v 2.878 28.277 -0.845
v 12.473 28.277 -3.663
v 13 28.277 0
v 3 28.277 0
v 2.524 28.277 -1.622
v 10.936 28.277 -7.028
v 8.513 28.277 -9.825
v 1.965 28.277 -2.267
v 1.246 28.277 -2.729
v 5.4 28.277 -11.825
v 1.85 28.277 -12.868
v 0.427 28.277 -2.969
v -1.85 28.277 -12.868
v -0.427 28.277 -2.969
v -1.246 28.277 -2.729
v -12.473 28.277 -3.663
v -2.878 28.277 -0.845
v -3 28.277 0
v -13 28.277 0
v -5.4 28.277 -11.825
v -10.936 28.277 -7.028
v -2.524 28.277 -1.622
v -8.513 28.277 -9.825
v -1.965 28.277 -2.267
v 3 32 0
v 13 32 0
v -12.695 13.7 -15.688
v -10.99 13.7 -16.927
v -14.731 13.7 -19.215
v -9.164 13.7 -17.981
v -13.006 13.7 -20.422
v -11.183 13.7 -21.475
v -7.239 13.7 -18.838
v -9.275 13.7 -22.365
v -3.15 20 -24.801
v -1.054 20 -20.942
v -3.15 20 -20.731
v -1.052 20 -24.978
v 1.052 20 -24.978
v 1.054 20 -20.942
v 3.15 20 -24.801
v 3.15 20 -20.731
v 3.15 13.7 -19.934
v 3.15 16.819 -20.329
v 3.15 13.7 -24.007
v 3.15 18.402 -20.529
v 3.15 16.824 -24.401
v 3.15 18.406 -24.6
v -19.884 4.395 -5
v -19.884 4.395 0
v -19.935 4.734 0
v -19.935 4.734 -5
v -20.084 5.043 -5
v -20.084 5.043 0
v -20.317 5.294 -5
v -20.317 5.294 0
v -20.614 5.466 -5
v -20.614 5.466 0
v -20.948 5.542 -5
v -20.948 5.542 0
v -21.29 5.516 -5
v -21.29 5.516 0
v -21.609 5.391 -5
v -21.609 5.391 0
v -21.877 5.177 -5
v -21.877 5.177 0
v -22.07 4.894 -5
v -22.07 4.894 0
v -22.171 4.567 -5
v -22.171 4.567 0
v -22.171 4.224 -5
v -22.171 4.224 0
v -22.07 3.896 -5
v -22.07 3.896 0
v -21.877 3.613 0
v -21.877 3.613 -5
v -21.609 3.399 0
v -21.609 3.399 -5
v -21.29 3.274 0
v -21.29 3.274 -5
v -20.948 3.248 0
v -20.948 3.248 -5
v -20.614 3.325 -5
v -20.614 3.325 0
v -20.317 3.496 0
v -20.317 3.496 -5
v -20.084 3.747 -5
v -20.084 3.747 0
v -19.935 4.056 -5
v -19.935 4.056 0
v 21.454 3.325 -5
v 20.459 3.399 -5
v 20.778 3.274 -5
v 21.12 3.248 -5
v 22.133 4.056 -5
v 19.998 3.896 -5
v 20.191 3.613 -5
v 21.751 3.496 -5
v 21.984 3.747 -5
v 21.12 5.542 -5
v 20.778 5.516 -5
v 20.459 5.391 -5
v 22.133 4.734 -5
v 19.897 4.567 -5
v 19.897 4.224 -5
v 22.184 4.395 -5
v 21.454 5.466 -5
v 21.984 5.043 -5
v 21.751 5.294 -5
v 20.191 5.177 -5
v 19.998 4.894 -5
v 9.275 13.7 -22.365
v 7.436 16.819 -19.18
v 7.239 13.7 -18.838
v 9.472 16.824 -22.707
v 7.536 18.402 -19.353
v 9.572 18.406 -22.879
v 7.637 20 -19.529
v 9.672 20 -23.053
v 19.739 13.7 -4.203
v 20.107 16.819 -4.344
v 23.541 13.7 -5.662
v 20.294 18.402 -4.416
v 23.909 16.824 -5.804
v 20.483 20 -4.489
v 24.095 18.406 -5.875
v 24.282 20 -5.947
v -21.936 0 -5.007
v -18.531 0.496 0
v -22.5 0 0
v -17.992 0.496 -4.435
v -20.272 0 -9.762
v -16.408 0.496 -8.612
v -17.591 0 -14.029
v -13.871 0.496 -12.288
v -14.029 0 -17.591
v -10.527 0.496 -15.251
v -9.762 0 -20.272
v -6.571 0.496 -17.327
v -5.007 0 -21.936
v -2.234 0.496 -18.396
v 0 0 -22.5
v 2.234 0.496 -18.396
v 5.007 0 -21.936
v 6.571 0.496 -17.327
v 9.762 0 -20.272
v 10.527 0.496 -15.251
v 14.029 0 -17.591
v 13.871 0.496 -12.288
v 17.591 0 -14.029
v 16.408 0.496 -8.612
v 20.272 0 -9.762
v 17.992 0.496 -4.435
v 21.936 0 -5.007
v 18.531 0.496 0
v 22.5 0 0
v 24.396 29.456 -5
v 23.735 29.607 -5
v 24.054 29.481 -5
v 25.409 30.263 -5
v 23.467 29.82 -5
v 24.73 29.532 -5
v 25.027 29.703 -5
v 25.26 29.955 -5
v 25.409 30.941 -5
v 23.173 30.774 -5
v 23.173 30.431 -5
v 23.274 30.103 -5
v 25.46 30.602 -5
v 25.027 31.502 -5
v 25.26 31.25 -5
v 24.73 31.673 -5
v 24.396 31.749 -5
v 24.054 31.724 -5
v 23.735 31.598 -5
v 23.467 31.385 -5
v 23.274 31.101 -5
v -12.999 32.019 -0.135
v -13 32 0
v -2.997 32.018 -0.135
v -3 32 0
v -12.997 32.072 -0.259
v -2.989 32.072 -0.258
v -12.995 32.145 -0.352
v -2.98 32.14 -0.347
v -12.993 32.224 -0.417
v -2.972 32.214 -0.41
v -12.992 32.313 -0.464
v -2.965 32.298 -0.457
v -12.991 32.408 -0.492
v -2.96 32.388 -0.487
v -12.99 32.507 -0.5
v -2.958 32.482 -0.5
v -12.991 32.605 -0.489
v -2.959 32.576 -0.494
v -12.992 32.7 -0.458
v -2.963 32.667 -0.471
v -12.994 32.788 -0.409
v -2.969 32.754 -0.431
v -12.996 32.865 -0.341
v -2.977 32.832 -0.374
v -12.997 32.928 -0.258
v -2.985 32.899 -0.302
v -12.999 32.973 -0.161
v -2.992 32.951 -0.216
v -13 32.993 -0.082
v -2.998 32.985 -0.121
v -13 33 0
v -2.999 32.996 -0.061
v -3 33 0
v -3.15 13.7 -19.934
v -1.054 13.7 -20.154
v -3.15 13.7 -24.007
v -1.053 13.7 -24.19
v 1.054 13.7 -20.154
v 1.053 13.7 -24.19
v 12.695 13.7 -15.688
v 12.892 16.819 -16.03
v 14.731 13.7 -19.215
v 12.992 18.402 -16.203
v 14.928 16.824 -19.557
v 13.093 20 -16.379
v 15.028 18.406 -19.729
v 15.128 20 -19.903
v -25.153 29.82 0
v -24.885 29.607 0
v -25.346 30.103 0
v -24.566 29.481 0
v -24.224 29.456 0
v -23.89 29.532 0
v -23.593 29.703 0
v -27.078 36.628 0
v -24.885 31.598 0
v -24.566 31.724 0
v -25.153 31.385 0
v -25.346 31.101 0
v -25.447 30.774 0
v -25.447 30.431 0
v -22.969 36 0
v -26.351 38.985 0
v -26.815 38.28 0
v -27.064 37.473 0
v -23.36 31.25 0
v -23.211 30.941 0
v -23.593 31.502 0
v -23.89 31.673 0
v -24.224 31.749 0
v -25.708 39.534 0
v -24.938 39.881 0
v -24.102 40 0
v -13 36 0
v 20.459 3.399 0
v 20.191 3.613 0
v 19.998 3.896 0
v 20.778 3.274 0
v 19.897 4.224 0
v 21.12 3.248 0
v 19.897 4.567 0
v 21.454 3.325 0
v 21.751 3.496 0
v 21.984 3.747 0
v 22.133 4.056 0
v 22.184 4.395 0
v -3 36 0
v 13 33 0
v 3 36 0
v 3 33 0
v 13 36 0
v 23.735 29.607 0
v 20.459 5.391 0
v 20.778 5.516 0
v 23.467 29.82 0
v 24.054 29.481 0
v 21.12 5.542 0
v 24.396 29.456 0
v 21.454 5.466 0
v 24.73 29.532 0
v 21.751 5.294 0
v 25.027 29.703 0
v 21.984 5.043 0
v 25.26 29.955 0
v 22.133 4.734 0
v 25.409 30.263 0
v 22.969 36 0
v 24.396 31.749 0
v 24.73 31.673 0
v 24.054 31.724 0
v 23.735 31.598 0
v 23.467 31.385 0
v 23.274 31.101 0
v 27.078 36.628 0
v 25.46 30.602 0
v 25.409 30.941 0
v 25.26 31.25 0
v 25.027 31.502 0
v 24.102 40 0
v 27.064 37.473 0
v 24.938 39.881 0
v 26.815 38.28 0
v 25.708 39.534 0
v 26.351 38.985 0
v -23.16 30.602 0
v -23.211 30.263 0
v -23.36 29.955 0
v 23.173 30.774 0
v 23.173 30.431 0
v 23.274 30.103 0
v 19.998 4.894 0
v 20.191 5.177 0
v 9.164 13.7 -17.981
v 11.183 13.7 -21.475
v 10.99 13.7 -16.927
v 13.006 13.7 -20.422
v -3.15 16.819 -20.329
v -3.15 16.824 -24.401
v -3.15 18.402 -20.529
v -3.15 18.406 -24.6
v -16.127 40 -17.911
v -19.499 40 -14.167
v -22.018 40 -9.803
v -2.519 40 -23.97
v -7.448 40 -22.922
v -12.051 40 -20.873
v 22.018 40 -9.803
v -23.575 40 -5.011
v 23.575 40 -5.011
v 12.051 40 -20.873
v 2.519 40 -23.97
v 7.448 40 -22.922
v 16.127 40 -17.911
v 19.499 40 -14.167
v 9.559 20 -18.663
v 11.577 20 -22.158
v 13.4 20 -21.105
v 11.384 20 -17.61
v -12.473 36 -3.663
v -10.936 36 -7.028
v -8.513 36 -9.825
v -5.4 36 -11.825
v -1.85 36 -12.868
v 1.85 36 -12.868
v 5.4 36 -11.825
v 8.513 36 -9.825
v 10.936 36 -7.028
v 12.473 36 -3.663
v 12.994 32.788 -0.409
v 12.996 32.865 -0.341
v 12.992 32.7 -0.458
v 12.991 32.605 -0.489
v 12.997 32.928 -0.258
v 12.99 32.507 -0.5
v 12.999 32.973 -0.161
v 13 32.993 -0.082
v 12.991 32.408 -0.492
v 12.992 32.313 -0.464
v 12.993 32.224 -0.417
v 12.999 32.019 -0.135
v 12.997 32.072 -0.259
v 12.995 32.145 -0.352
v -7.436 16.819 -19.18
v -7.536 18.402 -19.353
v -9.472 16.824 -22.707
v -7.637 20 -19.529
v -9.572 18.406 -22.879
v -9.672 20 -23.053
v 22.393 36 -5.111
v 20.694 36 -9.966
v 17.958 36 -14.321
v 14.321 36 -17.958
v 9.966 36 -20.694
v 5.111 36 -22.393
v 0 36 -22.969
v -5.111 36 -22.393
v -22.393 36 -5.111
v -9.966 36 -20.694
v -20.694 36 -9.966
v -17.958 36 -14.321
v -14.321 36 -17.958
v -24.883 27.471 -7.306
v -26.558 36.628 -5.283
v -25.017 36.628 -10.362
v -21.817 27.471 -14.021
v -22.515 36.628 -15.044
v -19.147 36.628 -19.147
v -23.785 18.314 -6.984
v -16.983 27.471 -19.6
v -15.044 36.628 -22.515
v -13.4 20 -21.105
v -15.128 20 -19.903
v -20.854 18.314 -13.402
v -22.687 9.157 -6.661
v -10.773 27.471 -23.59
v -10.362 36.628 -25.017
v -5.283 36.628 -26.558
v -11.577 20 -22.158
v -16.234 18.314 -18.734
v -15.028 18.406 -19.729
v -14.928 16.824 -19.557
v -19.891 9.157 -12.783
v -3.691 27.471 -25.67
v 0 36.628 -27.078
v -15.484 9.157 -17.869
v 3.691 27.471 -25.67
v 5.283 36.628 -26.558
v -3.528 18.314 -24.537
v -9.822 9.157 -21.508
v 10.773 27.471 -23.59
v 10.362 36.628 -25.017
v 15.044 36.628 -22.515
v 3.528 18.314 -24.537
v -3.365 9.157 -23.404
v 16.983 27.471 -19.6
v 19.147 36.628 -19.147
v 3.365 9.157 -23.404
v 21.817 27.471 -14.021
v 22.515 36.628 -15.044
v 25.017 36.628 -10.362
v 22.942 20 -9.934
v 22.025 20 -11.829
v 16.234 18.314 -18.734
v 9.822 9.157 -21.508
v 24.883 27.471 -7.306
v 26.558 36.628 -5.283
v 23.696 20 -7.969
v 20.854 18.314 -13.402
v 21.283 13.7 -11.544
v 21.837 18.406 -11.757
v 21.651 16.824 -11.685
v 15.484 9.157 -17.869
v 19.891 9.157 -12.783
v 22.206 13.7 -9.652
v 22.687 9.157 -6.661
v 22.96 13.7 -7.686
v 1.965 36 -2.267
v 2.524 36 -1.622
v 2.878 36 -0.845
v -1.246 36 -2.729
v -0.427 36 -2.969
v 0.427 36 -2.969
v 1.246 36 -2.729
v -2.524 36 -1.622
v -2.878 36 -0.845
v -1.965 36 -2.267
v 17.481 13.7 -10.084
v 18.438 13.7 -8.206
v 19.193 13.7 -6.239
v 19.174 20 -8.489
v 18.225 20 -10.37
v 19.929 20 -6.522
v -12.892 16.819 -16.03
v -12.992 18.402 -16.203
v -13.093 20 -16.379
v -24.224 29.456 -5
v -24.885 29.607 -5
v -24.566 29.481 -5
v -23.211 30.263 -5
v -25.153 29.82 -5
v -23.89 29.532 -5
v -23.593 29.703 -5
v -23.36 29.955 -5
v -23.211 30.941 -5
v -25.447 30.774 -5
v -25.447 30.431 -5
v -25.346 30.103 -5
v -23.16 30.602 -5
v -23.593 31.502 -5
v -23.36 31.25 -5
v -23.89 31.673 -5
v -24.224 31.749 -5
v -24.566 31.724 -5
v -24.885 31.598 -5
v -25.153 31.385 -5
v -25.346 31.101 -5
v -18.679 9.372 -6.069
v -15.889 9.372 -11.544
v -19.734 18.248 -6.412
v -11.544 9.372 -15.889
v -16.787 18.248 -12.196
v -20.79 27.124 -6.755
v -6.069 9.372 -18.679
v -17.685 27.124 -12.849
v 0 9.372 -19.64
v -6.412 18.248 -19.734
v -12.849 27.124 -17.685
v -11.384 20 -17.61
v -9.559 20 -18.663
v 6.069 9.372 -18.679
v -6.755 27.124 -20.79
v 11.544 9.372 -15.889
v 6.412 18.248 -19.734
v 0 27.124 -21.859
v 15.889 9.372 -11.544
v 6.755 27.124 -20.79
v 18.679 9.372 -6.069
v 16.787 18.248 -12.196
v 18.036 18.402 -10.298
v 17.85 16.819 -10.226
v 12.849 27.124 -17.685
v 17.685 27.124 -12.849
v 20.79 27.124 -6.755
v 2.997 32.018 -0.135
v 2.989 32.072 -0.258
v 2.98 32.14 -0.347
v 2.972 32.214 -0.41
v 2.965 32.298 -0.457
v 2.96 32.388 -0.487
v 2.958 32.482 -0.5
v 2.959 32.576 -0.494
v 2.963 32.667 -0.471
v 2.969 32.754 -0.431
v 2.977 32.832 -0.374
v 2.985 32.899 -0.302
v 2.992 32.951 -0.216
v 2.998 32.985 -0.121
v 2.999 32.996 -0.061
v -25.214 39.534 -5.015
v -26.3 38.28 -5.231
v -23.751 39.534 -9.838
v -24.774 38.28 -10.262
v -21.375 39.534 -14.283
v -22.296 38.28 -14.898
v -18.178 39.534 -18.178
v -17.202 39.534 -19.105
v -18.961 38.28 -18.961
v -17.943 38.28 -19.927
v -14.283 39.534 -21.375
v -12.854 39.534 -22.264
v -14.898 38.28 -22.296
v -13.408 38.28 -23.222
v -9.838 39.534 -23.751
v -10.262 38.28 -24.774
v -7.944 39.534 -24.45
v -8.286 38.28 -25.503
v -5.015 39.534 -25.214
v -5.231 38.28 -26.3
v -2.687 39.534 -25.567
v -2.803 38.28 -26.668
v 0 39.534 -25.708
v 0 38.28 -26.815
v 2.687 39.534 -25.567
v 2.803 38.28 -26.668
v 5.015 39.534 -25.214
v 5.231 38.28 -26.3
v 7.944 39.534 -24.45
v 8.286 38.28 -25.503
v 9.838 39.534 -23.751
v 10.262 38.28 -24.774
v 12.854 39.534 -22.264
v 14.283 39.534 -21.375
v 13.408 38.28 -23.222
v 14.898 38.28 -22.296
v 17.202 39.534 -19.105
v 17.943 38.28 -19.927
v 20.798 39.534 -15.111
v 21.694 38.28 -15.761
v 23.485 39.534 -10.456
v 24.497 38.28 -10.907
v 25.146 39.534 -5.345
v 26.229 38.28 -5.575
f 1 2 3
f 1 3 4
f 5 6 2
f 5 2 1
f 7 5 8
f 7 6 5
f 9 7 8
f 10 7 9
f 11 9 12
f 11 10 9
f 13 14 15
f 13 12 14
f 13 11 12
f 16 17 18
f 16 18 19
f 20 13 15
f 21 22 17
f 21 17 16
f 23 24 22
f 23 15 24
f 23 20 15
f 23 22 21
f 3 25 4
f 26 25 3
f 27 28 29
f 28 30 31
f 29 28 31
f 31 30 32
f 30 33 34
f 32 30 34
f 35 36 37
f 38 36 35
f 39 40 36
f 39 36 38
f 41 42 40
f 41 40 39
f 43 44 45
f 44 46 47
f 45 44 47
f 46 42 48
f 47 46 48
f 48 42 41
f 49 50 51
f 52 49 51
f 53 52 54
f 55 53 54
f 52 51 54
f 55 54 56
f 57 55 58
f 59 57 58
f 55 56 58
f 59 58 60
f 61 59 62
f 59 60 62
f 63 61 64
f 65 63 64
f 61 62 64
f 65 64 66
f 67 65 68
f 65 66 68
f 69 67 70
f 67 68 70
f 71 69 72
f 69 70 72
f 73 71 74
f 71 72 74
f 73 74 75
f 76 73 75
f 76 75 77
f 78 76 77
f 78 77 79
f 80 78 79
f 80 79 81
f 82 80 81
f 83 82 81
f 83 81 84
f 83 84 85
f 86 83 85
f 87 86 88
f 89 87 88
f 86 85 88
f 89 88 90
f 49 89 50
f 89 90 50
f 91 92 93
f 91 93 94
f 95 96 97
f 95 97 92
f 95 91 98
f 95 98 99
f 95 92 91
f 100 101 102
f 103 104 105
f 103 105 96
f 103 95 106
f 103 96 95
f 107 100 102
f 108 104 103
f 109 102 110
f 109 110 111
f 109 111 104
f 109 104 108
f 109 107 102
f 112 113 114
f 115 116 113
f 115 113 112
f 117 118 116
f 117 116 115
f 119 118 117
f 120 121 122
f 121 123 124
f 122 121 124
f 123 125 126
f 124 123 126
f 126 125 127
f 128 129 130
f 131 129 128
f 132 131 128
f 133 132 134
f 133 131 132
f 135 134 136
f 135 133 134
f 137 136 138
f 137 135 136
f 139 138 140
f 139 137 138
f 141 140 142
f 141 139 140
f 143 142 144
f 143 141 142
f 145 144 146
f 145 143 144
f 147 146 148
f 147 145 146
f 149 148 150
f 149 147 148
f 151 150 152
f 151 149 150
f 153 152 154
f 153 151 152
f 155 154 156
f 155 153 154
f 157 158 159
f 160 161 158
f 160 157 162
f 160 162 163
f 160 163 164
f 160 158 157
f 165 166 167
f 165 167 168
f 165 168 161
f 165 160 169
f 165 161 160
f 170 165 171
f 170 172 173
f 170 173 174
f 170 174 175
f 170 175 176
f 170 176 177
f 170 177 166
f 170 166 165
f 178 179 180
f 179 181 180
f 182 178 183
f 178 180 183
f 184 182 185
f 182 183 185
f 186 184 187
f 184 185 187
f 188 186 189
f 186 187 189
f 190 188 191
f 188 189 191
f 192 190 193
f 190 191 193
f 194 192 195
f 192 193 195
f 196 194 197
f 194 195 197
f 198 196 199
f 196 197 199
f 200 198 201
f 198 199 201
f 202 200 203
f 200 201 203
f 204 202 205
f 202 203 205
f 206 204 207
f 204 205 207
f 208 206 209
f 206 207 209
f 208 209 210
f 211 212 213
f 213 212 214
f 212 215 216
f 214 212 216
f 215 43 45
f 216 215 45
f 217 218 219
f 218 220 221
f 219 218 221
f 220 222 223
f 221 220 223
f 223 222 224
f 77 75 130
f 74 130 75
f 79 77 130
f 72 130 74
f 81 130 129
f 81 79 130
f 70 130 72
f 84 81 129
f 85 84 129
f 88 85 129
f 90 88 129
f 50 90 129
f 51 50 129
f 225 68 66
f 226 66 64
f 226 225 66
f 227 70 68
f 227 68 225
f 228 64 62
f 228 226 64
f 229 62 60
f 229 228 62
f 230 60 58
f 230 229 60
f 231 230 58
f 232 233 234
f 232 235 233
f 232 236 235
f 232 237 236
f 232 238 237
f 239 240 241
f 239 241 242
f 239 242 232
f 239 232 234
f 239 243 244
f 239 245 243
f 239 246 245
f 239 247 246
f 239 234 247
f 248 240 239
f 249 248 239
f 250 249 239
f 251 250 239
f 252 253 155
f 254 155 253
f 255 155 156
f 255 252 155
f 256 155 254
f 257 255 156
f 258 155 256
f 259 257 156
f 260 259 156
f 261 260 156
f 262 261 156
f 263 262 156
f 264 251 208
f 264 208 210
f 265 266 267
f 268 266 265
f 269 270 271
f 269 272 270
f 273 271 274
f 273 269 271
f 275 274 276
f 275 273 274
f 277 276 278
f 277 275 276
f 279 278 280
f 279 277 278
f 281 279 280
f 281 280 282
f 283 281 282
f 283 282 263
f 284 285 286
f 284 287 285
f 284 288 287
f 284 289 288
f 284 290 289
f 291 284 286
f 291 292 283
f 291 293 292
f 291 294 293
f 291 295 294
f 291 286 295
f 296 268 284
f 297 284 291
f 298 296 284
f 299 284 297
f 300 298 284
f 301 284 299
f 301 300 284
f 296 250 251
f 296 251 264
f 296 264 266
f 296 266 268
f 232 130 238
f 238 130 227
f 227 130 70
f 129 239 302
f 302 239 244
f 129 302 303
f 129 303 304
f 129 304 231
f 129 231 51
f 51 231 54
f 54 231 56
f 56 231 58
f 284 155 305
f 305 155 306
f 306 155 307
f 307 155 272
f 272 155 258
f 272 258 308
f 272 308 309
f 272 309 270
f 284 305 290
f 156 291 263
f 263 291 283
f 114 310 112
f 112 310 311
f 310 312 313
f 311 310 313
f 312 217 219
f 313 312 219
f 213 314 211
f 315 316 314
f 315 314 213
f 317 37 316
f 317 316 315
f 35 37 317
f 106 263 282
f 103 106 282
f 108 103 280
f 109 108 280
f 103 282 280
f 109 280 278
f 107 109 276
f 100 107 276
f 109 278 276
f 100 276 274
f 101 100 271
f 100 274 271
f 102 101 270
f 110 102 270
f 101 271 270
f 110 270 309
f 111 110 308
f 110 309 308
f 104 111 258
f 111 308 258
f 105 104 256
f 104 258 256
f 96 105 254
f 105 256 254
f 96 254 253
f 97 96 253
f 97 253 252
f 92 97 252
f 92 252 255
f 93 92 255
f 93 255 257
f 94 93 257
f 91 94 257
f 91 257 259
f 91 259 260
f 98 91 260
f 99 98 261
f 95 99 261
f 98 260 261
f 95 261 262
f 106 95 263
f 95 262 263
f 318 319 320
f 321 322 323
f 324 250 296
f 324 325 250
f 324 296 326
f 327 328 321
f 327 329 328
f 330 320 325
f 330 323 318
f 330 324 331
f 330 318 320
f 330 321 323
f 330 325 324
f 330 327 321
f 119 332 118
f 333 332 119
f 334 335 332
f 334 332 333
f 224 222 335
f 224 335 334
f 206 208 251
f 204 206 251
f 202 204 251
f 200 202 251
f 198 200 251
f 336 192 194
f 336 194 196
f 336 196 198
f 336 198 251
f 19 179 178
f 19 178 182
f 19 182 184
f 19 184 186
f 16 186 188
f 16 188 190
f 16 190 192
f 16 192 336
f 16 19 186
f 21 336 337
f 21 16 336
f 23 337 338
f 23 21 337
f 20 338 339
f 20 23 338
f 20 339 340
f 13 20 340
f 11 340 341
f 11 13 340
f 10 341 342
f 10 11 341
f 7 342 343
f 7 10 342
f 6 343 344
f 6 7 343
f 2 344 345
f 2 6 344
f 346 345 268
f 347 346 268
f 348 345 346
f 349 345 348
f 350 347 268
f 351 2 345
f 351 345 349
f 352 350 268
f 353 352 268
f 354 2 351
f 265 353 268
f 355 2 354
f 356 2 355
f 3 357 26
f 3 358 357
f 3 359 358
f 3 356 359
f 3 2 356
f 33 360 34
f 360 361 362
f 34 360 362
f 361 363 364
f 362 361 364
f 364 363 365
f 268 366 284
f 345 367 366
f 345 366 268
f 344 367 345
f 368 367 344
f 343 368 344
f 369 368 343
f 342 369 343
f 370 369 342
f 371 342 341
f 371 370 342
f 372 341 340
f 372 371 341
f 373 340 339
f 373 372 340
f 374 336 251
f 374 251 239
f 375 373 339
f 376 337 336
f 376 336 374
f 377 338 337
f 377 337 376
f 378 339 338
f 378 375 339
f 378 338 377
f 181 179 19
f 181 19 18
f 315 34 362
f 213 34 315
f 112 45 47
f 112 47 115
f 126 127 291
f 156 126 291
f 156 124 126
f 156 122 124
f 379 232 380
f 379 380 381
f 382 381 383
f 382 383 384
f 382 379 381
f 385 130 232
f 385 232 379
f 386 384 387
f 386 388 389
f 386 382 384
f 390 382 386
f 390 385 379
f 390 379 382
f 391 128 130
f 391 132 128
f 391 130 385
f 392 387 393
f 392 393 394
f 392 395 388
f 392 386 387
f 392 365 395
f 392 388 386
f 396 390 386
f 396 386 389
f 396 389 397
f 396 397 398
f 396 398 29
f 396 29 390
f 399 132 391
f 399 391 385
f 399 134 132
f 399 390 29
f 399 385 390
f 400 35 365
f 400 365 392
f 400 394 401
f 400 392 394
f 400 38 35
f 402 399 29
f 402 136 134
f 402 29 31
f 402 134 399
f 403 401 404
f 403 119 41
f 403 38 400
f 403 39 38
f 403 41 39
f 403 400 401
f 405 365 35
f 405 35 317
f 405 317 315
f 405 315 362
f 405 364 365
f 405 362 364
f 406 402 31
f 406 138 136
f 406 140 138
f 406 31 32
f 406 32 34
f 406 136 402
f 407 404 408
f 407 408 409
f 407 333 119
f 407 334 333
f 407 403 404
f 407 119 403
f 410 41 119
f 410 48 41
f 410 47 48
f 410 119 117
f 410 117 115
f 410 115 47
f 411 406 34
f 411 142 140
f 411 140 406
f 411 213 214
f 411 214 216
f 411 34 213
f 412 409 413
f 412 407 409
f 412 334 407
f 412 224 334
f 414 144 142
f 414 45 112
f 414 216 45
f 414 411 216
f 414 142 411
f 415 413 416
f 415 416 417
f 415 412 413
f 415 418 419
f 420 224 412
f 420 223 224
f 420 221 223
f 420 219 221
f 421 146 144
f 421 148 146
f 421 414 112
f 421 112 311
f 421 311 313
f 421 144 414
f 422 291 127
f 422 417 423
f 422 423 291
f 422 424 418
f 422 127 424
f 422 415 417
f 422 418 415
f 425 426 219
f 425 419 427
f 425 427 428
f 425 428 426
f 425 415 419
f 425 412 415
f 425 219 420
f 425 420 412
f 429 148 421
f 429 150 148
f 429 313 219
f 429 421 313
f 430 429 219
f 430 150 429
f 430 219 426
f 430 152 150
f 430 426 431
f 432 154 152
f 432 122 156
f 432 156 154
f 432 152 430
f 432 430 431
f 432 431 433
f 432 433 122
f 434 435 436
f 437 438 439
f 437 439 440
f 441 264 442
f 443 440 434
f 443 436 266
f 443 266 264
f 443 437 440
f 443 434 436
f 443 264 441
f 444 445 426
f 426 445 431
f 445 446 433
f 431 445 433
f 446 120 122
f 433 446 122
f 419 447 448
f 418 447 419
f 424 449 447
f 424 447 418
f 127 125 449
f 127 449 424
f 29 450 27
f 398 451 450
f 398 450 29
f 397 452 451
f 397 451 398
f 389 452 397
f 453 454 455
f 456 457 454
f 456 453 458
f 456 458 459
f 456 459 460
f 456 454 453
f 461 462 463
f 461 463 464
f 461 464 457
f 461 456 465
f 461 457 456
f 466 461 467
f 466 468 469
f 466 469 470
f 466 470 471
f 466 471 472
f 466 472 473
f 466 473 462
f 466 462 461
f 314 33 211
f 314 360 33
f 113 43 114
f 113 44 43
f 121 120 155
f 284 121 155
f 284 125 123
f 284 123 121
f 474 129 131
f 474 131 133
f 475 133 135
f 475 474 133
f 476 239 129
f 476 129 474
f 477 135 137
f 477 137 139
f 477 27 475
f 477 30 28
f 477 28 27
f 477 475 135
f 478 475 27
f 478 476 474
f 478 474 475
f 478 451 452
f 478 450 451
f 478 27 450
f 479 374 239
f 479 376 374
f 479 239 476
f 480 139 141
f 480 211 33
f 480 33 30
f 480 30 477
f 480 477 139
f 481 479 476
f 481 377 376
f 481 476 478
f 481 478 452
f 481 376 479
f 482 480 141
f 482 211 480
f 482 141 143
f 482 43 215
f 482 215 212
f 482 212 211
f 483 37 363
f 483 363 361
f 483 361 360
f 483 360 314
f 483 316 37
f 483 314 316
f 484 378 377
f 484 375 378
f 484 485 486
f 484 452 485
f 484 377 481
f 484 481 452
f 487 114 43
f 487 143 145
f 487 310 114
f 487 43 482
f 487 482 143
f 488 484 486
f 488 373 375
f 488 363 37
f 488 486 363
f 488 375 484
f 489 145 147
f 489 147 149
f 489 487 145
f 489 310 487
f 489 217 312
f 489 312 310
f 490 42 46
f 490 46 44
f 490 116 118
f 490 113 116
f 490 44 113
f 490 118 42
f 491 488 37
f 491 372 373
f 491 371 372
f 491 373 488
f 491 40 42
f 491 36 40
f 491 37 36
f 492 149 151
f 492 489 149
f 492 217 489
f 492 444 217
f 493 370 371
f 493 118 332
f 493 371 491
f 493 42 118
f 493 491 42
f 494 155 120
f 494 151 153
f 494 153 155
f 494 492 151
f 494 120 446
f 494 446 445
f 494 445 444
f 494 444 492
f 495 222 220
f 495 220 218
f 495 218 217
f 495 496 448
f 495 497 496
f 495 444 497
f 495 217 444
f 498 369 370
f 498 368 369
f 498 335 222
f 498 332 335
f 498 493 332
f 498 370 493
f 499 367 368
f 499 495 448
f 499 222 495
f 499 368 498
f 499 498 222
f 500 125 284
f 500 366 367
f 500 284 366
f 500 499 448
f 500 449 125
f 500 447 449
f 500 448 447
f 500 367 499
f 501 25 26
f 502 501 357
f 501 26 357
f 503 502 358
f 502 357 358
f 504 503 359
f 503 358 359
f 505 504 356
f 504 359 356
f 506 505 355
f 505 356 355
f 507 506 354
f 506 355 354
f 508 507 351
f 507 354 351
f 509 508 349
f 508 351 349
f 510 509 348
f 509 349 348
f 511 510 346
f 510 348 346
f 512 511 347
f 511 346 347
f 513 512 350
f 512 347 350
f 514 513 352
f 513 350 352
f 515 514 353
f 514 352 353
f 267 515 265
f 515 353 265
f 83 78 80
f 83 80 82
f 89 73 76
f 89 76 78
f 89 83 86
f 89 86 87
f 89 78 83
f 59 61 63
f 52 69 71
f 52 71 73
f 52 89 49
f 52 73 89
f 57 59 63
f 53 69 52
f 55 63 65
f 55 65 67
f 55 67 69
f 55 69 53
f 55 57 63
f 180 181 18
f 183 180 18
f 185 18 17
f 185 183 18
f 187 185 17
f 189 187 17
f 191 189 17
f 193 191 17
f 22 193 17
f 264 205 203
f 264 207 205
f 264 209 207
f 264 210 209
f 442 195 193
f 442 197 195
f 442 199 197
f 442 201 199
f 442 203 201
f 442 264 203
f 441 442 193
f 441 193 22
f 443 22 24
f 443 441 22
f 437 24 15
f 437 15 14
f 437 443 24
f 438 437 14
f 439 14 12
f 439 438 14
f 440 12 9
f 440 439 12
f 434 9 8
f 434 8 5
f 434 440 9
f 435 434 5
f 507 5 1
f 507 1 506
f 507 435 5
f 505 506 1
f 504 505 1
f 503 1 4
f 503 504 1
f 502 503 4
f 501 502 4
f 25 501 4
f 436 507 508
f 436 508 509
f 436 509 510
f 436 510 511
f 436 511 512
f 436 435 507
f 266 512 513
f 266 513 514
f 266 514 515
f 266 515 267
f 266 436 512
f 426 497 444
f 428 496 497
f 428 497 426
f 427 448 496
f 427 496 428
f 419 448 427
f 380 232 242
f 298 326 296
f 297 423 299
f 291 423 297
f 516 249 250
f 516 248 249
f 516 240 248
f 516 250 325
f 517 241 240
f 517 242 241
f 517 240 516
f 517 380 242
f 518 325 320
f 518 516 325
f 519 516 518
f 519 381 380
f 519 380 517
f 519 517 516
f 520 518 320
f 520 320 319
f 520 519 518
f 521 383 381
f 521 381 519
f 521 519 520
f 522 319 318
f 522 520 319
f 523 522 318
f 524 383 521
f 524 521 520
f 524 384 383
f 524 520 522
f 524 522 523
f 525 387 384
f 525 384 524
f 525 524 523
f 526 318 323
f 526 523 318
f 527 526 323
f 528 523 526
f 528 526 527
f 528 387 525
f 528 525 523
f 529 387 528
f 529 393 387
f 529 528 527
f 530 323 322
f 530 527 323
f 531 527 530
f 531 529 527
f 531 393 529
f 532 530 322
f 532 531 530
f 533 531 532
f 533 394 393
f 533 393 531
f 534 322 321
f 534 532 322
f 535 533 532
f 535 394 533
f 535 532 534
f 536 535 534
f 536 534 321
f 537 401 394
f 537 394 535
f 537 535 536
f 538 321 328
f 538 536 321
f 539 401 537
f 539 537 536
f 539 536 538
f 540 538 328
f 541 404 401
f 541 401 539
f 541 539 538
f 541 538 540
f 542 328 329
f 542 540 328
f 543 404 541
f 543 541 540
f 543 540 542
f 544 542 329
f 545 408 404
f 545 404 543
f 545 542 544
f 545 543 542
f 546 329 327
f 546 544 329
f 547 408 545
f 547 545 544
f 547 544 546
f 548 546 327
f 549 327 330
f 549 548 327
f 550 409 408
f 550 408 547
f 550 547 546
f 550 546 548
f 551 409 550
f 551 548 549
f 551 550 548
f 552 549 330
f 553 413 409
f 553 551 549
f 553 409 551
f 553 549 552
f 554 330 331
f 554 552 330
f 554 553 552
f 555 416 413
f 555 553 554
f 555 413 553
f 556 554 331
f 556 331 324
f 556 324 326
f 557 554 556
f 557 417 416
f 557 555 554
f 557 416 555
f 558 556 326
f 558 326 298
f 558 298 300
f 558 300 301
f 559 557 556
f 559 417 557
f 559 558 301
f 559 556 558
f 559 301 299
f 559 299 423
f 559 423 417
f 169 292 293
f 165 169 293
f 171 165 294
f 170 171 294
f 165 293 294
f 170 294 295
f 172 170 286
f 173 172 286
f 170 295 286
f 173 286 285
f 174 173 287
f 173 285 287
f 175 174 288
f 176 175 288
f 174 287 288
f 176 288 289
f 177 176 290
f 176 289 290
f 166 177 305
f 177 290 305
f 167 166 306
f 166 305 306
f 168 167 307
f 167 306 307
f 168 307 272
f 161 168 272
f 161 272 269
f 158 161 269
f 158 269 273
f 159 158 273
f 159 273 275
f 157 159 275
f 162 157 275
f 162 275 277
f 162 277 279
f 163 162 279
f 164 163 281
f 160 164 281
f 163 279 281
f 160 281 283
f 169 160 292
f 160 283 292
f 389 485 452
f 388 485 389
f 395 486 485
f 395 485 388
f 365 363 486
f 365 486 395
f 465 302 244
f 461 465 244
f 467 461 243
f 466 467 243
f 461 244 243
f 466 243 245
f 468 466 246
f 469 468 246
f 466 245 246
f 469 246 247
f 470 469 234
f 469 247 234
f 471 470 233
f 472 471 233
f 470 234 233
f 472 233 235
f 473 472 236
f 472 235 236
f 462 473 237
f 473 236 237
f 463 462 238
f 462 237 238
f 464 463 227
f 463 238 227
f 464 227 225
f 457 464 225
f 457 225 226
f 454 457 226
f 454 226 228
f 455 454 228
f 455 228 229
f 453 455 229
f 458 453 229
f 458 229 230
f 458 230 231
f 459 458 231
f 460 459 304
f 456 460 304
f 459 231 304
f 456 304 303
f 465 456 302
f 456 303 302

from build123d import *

# Parameters (mm, degrees)
REVOLVE1_ANGLE                  = 180
FILLET1_R                       = 3
SKETCH2_W                       = 30
SKETCH2_H                       = 0.5
SKETCH3_R                       = 1.15
CUT_EXTRUDE1_DEPTH              = 5
SKETCH4_W                       = 7
SKETCH4_H                       = 6.3
CUT_EXTRUDE2_DEPTH              = 3.15
CIRPATTERN1_COUNT               = 2
CIRPATTERN1_ANGLE               = 30
CIRPATTERN1_THE_OTHER_WAY_COUNT = 2
CIRPATTERN1_THE_OTHER_WAY_ANGLE = 30
CIRPATTERN2_COUNT               = 2
CIRPATTERN2_ANGLE               = 69


with BuildPart() as part:
    # Sketch1 → Revolve1 (revolve)
    with BuildSketch(Plane.XY):
        Polygon((0, 40), (-27.5, 40), (-22.5, 0), (-18.530888493, 0.496138938), (-22.968871126, 36), (-13, 36), (-13, 28.277027027), (-3, 28.277027027), (-3, 36), (0, 36), align=None)
    revolve(axis=Axis((0, 40, 0), (0, -1, 0)), revolution_arc=REVOLVE1_ANGLE)

    # Fillet1
    fillet1_edges = [part.edges().sort_by_distance(p)[0] for p in [
        (0, 40, -27.5),
    ]]
    fillet(fillet1_edges, radius=FILLET1_R)

    # Sketch2 → Cut-Revolve1 (revolve, cut)
    with BuildSketch(Plane.XY):
        with Locations((1, 32.75)):
            Rectangle(SKETCH2_W, SKETCH2_H)
    revolve(axis=Axis((-14, 32.5, 0), (1, 0, 0)), mode=Mode.SUBTRACT)

    # Sketch3 → Cut-Extrude1 (cut)
    with BuildSketch(Plane.XY):
        with Locations((-24.309743639, 30.602464611)):
            Circle(SKETCH3_R)
        with Locations((-21.033834323, 4.395190082)):
            Circle(SKETCH3_R)
        with Locations((21.033834323, 4.395190082)):
            Circle(SKETCH3_R)
        with Locations((24.309743639, 30.602464611)):
            Circle(SKETCH3_R)
    extrude(amount=-CUT_EXTRUDE1_DEPTH, mode=Mode.SUBTRACT)

    # Sketch4 → Cut-Extrude2 (cut, symmetric)
    with BuildSketch(Plane(origin=(0, 0, 0), x_dir=(0, 0, -1), z_dir=(1, 0, 0))):
        with Locations((22.970533345, 16.85)):
            Rectangle(SKETCH4_W, SKETCH4_H)
    cut_extrude2 = extrude(amount=CUT_EXTRUDE2_DEPTH, both=True, mode=Mode.SUBTRACT)

    # CirPattern1: Cut-Extrude2 ×2 about axis
    cirpattern1_axis = Axis((0, 36.627895796, 0), (0, -1, 0))
    for i in range(1, CIRPATTERN1_COUNT):
        add(cut_extrude2.rotate(cirpattern1_axis, i * CIRPATTERN1_ANGLE / (CIRPATTERN1_COUNT - 1)), mode=Mode.SUBTRACT)

    # CirPattern1 the other way: Cut-Extrude2 ×2 about axis
    cirpattern1_the_other_way_axis = Axis((0, 36.627895796, 0), (0, 1, 0))
    for i in range(1, CIRPATTERN1_THE_OTHER_WAY_COUNT):
        add(cut_extrude2.rotate(cirpattern1_the_other_way_axis, i * CIRPATTERN1_THE_OTHER_WAY_ANGLE / (CIRPATTERN1_THE_OTHER_WAY_COUNT - 1)), mode=Mode.SUBTRACT)

    # CirPattern2: Cut-Extrude2 ×2 about axis
    cirpattern2_axis = Axis((0, 36.627895796, 0), (0, -1, 0))
    for i in range(1, CIRPATTERN2_COUNT):
        add(cut_extrude2.rotate(cirpattern2_axis, i * CIRPATTERN2_ANGLE / (CIRPATTERN2_COUNT - 1)), mode=Mode.SUBTRACT)


solid = part.part
